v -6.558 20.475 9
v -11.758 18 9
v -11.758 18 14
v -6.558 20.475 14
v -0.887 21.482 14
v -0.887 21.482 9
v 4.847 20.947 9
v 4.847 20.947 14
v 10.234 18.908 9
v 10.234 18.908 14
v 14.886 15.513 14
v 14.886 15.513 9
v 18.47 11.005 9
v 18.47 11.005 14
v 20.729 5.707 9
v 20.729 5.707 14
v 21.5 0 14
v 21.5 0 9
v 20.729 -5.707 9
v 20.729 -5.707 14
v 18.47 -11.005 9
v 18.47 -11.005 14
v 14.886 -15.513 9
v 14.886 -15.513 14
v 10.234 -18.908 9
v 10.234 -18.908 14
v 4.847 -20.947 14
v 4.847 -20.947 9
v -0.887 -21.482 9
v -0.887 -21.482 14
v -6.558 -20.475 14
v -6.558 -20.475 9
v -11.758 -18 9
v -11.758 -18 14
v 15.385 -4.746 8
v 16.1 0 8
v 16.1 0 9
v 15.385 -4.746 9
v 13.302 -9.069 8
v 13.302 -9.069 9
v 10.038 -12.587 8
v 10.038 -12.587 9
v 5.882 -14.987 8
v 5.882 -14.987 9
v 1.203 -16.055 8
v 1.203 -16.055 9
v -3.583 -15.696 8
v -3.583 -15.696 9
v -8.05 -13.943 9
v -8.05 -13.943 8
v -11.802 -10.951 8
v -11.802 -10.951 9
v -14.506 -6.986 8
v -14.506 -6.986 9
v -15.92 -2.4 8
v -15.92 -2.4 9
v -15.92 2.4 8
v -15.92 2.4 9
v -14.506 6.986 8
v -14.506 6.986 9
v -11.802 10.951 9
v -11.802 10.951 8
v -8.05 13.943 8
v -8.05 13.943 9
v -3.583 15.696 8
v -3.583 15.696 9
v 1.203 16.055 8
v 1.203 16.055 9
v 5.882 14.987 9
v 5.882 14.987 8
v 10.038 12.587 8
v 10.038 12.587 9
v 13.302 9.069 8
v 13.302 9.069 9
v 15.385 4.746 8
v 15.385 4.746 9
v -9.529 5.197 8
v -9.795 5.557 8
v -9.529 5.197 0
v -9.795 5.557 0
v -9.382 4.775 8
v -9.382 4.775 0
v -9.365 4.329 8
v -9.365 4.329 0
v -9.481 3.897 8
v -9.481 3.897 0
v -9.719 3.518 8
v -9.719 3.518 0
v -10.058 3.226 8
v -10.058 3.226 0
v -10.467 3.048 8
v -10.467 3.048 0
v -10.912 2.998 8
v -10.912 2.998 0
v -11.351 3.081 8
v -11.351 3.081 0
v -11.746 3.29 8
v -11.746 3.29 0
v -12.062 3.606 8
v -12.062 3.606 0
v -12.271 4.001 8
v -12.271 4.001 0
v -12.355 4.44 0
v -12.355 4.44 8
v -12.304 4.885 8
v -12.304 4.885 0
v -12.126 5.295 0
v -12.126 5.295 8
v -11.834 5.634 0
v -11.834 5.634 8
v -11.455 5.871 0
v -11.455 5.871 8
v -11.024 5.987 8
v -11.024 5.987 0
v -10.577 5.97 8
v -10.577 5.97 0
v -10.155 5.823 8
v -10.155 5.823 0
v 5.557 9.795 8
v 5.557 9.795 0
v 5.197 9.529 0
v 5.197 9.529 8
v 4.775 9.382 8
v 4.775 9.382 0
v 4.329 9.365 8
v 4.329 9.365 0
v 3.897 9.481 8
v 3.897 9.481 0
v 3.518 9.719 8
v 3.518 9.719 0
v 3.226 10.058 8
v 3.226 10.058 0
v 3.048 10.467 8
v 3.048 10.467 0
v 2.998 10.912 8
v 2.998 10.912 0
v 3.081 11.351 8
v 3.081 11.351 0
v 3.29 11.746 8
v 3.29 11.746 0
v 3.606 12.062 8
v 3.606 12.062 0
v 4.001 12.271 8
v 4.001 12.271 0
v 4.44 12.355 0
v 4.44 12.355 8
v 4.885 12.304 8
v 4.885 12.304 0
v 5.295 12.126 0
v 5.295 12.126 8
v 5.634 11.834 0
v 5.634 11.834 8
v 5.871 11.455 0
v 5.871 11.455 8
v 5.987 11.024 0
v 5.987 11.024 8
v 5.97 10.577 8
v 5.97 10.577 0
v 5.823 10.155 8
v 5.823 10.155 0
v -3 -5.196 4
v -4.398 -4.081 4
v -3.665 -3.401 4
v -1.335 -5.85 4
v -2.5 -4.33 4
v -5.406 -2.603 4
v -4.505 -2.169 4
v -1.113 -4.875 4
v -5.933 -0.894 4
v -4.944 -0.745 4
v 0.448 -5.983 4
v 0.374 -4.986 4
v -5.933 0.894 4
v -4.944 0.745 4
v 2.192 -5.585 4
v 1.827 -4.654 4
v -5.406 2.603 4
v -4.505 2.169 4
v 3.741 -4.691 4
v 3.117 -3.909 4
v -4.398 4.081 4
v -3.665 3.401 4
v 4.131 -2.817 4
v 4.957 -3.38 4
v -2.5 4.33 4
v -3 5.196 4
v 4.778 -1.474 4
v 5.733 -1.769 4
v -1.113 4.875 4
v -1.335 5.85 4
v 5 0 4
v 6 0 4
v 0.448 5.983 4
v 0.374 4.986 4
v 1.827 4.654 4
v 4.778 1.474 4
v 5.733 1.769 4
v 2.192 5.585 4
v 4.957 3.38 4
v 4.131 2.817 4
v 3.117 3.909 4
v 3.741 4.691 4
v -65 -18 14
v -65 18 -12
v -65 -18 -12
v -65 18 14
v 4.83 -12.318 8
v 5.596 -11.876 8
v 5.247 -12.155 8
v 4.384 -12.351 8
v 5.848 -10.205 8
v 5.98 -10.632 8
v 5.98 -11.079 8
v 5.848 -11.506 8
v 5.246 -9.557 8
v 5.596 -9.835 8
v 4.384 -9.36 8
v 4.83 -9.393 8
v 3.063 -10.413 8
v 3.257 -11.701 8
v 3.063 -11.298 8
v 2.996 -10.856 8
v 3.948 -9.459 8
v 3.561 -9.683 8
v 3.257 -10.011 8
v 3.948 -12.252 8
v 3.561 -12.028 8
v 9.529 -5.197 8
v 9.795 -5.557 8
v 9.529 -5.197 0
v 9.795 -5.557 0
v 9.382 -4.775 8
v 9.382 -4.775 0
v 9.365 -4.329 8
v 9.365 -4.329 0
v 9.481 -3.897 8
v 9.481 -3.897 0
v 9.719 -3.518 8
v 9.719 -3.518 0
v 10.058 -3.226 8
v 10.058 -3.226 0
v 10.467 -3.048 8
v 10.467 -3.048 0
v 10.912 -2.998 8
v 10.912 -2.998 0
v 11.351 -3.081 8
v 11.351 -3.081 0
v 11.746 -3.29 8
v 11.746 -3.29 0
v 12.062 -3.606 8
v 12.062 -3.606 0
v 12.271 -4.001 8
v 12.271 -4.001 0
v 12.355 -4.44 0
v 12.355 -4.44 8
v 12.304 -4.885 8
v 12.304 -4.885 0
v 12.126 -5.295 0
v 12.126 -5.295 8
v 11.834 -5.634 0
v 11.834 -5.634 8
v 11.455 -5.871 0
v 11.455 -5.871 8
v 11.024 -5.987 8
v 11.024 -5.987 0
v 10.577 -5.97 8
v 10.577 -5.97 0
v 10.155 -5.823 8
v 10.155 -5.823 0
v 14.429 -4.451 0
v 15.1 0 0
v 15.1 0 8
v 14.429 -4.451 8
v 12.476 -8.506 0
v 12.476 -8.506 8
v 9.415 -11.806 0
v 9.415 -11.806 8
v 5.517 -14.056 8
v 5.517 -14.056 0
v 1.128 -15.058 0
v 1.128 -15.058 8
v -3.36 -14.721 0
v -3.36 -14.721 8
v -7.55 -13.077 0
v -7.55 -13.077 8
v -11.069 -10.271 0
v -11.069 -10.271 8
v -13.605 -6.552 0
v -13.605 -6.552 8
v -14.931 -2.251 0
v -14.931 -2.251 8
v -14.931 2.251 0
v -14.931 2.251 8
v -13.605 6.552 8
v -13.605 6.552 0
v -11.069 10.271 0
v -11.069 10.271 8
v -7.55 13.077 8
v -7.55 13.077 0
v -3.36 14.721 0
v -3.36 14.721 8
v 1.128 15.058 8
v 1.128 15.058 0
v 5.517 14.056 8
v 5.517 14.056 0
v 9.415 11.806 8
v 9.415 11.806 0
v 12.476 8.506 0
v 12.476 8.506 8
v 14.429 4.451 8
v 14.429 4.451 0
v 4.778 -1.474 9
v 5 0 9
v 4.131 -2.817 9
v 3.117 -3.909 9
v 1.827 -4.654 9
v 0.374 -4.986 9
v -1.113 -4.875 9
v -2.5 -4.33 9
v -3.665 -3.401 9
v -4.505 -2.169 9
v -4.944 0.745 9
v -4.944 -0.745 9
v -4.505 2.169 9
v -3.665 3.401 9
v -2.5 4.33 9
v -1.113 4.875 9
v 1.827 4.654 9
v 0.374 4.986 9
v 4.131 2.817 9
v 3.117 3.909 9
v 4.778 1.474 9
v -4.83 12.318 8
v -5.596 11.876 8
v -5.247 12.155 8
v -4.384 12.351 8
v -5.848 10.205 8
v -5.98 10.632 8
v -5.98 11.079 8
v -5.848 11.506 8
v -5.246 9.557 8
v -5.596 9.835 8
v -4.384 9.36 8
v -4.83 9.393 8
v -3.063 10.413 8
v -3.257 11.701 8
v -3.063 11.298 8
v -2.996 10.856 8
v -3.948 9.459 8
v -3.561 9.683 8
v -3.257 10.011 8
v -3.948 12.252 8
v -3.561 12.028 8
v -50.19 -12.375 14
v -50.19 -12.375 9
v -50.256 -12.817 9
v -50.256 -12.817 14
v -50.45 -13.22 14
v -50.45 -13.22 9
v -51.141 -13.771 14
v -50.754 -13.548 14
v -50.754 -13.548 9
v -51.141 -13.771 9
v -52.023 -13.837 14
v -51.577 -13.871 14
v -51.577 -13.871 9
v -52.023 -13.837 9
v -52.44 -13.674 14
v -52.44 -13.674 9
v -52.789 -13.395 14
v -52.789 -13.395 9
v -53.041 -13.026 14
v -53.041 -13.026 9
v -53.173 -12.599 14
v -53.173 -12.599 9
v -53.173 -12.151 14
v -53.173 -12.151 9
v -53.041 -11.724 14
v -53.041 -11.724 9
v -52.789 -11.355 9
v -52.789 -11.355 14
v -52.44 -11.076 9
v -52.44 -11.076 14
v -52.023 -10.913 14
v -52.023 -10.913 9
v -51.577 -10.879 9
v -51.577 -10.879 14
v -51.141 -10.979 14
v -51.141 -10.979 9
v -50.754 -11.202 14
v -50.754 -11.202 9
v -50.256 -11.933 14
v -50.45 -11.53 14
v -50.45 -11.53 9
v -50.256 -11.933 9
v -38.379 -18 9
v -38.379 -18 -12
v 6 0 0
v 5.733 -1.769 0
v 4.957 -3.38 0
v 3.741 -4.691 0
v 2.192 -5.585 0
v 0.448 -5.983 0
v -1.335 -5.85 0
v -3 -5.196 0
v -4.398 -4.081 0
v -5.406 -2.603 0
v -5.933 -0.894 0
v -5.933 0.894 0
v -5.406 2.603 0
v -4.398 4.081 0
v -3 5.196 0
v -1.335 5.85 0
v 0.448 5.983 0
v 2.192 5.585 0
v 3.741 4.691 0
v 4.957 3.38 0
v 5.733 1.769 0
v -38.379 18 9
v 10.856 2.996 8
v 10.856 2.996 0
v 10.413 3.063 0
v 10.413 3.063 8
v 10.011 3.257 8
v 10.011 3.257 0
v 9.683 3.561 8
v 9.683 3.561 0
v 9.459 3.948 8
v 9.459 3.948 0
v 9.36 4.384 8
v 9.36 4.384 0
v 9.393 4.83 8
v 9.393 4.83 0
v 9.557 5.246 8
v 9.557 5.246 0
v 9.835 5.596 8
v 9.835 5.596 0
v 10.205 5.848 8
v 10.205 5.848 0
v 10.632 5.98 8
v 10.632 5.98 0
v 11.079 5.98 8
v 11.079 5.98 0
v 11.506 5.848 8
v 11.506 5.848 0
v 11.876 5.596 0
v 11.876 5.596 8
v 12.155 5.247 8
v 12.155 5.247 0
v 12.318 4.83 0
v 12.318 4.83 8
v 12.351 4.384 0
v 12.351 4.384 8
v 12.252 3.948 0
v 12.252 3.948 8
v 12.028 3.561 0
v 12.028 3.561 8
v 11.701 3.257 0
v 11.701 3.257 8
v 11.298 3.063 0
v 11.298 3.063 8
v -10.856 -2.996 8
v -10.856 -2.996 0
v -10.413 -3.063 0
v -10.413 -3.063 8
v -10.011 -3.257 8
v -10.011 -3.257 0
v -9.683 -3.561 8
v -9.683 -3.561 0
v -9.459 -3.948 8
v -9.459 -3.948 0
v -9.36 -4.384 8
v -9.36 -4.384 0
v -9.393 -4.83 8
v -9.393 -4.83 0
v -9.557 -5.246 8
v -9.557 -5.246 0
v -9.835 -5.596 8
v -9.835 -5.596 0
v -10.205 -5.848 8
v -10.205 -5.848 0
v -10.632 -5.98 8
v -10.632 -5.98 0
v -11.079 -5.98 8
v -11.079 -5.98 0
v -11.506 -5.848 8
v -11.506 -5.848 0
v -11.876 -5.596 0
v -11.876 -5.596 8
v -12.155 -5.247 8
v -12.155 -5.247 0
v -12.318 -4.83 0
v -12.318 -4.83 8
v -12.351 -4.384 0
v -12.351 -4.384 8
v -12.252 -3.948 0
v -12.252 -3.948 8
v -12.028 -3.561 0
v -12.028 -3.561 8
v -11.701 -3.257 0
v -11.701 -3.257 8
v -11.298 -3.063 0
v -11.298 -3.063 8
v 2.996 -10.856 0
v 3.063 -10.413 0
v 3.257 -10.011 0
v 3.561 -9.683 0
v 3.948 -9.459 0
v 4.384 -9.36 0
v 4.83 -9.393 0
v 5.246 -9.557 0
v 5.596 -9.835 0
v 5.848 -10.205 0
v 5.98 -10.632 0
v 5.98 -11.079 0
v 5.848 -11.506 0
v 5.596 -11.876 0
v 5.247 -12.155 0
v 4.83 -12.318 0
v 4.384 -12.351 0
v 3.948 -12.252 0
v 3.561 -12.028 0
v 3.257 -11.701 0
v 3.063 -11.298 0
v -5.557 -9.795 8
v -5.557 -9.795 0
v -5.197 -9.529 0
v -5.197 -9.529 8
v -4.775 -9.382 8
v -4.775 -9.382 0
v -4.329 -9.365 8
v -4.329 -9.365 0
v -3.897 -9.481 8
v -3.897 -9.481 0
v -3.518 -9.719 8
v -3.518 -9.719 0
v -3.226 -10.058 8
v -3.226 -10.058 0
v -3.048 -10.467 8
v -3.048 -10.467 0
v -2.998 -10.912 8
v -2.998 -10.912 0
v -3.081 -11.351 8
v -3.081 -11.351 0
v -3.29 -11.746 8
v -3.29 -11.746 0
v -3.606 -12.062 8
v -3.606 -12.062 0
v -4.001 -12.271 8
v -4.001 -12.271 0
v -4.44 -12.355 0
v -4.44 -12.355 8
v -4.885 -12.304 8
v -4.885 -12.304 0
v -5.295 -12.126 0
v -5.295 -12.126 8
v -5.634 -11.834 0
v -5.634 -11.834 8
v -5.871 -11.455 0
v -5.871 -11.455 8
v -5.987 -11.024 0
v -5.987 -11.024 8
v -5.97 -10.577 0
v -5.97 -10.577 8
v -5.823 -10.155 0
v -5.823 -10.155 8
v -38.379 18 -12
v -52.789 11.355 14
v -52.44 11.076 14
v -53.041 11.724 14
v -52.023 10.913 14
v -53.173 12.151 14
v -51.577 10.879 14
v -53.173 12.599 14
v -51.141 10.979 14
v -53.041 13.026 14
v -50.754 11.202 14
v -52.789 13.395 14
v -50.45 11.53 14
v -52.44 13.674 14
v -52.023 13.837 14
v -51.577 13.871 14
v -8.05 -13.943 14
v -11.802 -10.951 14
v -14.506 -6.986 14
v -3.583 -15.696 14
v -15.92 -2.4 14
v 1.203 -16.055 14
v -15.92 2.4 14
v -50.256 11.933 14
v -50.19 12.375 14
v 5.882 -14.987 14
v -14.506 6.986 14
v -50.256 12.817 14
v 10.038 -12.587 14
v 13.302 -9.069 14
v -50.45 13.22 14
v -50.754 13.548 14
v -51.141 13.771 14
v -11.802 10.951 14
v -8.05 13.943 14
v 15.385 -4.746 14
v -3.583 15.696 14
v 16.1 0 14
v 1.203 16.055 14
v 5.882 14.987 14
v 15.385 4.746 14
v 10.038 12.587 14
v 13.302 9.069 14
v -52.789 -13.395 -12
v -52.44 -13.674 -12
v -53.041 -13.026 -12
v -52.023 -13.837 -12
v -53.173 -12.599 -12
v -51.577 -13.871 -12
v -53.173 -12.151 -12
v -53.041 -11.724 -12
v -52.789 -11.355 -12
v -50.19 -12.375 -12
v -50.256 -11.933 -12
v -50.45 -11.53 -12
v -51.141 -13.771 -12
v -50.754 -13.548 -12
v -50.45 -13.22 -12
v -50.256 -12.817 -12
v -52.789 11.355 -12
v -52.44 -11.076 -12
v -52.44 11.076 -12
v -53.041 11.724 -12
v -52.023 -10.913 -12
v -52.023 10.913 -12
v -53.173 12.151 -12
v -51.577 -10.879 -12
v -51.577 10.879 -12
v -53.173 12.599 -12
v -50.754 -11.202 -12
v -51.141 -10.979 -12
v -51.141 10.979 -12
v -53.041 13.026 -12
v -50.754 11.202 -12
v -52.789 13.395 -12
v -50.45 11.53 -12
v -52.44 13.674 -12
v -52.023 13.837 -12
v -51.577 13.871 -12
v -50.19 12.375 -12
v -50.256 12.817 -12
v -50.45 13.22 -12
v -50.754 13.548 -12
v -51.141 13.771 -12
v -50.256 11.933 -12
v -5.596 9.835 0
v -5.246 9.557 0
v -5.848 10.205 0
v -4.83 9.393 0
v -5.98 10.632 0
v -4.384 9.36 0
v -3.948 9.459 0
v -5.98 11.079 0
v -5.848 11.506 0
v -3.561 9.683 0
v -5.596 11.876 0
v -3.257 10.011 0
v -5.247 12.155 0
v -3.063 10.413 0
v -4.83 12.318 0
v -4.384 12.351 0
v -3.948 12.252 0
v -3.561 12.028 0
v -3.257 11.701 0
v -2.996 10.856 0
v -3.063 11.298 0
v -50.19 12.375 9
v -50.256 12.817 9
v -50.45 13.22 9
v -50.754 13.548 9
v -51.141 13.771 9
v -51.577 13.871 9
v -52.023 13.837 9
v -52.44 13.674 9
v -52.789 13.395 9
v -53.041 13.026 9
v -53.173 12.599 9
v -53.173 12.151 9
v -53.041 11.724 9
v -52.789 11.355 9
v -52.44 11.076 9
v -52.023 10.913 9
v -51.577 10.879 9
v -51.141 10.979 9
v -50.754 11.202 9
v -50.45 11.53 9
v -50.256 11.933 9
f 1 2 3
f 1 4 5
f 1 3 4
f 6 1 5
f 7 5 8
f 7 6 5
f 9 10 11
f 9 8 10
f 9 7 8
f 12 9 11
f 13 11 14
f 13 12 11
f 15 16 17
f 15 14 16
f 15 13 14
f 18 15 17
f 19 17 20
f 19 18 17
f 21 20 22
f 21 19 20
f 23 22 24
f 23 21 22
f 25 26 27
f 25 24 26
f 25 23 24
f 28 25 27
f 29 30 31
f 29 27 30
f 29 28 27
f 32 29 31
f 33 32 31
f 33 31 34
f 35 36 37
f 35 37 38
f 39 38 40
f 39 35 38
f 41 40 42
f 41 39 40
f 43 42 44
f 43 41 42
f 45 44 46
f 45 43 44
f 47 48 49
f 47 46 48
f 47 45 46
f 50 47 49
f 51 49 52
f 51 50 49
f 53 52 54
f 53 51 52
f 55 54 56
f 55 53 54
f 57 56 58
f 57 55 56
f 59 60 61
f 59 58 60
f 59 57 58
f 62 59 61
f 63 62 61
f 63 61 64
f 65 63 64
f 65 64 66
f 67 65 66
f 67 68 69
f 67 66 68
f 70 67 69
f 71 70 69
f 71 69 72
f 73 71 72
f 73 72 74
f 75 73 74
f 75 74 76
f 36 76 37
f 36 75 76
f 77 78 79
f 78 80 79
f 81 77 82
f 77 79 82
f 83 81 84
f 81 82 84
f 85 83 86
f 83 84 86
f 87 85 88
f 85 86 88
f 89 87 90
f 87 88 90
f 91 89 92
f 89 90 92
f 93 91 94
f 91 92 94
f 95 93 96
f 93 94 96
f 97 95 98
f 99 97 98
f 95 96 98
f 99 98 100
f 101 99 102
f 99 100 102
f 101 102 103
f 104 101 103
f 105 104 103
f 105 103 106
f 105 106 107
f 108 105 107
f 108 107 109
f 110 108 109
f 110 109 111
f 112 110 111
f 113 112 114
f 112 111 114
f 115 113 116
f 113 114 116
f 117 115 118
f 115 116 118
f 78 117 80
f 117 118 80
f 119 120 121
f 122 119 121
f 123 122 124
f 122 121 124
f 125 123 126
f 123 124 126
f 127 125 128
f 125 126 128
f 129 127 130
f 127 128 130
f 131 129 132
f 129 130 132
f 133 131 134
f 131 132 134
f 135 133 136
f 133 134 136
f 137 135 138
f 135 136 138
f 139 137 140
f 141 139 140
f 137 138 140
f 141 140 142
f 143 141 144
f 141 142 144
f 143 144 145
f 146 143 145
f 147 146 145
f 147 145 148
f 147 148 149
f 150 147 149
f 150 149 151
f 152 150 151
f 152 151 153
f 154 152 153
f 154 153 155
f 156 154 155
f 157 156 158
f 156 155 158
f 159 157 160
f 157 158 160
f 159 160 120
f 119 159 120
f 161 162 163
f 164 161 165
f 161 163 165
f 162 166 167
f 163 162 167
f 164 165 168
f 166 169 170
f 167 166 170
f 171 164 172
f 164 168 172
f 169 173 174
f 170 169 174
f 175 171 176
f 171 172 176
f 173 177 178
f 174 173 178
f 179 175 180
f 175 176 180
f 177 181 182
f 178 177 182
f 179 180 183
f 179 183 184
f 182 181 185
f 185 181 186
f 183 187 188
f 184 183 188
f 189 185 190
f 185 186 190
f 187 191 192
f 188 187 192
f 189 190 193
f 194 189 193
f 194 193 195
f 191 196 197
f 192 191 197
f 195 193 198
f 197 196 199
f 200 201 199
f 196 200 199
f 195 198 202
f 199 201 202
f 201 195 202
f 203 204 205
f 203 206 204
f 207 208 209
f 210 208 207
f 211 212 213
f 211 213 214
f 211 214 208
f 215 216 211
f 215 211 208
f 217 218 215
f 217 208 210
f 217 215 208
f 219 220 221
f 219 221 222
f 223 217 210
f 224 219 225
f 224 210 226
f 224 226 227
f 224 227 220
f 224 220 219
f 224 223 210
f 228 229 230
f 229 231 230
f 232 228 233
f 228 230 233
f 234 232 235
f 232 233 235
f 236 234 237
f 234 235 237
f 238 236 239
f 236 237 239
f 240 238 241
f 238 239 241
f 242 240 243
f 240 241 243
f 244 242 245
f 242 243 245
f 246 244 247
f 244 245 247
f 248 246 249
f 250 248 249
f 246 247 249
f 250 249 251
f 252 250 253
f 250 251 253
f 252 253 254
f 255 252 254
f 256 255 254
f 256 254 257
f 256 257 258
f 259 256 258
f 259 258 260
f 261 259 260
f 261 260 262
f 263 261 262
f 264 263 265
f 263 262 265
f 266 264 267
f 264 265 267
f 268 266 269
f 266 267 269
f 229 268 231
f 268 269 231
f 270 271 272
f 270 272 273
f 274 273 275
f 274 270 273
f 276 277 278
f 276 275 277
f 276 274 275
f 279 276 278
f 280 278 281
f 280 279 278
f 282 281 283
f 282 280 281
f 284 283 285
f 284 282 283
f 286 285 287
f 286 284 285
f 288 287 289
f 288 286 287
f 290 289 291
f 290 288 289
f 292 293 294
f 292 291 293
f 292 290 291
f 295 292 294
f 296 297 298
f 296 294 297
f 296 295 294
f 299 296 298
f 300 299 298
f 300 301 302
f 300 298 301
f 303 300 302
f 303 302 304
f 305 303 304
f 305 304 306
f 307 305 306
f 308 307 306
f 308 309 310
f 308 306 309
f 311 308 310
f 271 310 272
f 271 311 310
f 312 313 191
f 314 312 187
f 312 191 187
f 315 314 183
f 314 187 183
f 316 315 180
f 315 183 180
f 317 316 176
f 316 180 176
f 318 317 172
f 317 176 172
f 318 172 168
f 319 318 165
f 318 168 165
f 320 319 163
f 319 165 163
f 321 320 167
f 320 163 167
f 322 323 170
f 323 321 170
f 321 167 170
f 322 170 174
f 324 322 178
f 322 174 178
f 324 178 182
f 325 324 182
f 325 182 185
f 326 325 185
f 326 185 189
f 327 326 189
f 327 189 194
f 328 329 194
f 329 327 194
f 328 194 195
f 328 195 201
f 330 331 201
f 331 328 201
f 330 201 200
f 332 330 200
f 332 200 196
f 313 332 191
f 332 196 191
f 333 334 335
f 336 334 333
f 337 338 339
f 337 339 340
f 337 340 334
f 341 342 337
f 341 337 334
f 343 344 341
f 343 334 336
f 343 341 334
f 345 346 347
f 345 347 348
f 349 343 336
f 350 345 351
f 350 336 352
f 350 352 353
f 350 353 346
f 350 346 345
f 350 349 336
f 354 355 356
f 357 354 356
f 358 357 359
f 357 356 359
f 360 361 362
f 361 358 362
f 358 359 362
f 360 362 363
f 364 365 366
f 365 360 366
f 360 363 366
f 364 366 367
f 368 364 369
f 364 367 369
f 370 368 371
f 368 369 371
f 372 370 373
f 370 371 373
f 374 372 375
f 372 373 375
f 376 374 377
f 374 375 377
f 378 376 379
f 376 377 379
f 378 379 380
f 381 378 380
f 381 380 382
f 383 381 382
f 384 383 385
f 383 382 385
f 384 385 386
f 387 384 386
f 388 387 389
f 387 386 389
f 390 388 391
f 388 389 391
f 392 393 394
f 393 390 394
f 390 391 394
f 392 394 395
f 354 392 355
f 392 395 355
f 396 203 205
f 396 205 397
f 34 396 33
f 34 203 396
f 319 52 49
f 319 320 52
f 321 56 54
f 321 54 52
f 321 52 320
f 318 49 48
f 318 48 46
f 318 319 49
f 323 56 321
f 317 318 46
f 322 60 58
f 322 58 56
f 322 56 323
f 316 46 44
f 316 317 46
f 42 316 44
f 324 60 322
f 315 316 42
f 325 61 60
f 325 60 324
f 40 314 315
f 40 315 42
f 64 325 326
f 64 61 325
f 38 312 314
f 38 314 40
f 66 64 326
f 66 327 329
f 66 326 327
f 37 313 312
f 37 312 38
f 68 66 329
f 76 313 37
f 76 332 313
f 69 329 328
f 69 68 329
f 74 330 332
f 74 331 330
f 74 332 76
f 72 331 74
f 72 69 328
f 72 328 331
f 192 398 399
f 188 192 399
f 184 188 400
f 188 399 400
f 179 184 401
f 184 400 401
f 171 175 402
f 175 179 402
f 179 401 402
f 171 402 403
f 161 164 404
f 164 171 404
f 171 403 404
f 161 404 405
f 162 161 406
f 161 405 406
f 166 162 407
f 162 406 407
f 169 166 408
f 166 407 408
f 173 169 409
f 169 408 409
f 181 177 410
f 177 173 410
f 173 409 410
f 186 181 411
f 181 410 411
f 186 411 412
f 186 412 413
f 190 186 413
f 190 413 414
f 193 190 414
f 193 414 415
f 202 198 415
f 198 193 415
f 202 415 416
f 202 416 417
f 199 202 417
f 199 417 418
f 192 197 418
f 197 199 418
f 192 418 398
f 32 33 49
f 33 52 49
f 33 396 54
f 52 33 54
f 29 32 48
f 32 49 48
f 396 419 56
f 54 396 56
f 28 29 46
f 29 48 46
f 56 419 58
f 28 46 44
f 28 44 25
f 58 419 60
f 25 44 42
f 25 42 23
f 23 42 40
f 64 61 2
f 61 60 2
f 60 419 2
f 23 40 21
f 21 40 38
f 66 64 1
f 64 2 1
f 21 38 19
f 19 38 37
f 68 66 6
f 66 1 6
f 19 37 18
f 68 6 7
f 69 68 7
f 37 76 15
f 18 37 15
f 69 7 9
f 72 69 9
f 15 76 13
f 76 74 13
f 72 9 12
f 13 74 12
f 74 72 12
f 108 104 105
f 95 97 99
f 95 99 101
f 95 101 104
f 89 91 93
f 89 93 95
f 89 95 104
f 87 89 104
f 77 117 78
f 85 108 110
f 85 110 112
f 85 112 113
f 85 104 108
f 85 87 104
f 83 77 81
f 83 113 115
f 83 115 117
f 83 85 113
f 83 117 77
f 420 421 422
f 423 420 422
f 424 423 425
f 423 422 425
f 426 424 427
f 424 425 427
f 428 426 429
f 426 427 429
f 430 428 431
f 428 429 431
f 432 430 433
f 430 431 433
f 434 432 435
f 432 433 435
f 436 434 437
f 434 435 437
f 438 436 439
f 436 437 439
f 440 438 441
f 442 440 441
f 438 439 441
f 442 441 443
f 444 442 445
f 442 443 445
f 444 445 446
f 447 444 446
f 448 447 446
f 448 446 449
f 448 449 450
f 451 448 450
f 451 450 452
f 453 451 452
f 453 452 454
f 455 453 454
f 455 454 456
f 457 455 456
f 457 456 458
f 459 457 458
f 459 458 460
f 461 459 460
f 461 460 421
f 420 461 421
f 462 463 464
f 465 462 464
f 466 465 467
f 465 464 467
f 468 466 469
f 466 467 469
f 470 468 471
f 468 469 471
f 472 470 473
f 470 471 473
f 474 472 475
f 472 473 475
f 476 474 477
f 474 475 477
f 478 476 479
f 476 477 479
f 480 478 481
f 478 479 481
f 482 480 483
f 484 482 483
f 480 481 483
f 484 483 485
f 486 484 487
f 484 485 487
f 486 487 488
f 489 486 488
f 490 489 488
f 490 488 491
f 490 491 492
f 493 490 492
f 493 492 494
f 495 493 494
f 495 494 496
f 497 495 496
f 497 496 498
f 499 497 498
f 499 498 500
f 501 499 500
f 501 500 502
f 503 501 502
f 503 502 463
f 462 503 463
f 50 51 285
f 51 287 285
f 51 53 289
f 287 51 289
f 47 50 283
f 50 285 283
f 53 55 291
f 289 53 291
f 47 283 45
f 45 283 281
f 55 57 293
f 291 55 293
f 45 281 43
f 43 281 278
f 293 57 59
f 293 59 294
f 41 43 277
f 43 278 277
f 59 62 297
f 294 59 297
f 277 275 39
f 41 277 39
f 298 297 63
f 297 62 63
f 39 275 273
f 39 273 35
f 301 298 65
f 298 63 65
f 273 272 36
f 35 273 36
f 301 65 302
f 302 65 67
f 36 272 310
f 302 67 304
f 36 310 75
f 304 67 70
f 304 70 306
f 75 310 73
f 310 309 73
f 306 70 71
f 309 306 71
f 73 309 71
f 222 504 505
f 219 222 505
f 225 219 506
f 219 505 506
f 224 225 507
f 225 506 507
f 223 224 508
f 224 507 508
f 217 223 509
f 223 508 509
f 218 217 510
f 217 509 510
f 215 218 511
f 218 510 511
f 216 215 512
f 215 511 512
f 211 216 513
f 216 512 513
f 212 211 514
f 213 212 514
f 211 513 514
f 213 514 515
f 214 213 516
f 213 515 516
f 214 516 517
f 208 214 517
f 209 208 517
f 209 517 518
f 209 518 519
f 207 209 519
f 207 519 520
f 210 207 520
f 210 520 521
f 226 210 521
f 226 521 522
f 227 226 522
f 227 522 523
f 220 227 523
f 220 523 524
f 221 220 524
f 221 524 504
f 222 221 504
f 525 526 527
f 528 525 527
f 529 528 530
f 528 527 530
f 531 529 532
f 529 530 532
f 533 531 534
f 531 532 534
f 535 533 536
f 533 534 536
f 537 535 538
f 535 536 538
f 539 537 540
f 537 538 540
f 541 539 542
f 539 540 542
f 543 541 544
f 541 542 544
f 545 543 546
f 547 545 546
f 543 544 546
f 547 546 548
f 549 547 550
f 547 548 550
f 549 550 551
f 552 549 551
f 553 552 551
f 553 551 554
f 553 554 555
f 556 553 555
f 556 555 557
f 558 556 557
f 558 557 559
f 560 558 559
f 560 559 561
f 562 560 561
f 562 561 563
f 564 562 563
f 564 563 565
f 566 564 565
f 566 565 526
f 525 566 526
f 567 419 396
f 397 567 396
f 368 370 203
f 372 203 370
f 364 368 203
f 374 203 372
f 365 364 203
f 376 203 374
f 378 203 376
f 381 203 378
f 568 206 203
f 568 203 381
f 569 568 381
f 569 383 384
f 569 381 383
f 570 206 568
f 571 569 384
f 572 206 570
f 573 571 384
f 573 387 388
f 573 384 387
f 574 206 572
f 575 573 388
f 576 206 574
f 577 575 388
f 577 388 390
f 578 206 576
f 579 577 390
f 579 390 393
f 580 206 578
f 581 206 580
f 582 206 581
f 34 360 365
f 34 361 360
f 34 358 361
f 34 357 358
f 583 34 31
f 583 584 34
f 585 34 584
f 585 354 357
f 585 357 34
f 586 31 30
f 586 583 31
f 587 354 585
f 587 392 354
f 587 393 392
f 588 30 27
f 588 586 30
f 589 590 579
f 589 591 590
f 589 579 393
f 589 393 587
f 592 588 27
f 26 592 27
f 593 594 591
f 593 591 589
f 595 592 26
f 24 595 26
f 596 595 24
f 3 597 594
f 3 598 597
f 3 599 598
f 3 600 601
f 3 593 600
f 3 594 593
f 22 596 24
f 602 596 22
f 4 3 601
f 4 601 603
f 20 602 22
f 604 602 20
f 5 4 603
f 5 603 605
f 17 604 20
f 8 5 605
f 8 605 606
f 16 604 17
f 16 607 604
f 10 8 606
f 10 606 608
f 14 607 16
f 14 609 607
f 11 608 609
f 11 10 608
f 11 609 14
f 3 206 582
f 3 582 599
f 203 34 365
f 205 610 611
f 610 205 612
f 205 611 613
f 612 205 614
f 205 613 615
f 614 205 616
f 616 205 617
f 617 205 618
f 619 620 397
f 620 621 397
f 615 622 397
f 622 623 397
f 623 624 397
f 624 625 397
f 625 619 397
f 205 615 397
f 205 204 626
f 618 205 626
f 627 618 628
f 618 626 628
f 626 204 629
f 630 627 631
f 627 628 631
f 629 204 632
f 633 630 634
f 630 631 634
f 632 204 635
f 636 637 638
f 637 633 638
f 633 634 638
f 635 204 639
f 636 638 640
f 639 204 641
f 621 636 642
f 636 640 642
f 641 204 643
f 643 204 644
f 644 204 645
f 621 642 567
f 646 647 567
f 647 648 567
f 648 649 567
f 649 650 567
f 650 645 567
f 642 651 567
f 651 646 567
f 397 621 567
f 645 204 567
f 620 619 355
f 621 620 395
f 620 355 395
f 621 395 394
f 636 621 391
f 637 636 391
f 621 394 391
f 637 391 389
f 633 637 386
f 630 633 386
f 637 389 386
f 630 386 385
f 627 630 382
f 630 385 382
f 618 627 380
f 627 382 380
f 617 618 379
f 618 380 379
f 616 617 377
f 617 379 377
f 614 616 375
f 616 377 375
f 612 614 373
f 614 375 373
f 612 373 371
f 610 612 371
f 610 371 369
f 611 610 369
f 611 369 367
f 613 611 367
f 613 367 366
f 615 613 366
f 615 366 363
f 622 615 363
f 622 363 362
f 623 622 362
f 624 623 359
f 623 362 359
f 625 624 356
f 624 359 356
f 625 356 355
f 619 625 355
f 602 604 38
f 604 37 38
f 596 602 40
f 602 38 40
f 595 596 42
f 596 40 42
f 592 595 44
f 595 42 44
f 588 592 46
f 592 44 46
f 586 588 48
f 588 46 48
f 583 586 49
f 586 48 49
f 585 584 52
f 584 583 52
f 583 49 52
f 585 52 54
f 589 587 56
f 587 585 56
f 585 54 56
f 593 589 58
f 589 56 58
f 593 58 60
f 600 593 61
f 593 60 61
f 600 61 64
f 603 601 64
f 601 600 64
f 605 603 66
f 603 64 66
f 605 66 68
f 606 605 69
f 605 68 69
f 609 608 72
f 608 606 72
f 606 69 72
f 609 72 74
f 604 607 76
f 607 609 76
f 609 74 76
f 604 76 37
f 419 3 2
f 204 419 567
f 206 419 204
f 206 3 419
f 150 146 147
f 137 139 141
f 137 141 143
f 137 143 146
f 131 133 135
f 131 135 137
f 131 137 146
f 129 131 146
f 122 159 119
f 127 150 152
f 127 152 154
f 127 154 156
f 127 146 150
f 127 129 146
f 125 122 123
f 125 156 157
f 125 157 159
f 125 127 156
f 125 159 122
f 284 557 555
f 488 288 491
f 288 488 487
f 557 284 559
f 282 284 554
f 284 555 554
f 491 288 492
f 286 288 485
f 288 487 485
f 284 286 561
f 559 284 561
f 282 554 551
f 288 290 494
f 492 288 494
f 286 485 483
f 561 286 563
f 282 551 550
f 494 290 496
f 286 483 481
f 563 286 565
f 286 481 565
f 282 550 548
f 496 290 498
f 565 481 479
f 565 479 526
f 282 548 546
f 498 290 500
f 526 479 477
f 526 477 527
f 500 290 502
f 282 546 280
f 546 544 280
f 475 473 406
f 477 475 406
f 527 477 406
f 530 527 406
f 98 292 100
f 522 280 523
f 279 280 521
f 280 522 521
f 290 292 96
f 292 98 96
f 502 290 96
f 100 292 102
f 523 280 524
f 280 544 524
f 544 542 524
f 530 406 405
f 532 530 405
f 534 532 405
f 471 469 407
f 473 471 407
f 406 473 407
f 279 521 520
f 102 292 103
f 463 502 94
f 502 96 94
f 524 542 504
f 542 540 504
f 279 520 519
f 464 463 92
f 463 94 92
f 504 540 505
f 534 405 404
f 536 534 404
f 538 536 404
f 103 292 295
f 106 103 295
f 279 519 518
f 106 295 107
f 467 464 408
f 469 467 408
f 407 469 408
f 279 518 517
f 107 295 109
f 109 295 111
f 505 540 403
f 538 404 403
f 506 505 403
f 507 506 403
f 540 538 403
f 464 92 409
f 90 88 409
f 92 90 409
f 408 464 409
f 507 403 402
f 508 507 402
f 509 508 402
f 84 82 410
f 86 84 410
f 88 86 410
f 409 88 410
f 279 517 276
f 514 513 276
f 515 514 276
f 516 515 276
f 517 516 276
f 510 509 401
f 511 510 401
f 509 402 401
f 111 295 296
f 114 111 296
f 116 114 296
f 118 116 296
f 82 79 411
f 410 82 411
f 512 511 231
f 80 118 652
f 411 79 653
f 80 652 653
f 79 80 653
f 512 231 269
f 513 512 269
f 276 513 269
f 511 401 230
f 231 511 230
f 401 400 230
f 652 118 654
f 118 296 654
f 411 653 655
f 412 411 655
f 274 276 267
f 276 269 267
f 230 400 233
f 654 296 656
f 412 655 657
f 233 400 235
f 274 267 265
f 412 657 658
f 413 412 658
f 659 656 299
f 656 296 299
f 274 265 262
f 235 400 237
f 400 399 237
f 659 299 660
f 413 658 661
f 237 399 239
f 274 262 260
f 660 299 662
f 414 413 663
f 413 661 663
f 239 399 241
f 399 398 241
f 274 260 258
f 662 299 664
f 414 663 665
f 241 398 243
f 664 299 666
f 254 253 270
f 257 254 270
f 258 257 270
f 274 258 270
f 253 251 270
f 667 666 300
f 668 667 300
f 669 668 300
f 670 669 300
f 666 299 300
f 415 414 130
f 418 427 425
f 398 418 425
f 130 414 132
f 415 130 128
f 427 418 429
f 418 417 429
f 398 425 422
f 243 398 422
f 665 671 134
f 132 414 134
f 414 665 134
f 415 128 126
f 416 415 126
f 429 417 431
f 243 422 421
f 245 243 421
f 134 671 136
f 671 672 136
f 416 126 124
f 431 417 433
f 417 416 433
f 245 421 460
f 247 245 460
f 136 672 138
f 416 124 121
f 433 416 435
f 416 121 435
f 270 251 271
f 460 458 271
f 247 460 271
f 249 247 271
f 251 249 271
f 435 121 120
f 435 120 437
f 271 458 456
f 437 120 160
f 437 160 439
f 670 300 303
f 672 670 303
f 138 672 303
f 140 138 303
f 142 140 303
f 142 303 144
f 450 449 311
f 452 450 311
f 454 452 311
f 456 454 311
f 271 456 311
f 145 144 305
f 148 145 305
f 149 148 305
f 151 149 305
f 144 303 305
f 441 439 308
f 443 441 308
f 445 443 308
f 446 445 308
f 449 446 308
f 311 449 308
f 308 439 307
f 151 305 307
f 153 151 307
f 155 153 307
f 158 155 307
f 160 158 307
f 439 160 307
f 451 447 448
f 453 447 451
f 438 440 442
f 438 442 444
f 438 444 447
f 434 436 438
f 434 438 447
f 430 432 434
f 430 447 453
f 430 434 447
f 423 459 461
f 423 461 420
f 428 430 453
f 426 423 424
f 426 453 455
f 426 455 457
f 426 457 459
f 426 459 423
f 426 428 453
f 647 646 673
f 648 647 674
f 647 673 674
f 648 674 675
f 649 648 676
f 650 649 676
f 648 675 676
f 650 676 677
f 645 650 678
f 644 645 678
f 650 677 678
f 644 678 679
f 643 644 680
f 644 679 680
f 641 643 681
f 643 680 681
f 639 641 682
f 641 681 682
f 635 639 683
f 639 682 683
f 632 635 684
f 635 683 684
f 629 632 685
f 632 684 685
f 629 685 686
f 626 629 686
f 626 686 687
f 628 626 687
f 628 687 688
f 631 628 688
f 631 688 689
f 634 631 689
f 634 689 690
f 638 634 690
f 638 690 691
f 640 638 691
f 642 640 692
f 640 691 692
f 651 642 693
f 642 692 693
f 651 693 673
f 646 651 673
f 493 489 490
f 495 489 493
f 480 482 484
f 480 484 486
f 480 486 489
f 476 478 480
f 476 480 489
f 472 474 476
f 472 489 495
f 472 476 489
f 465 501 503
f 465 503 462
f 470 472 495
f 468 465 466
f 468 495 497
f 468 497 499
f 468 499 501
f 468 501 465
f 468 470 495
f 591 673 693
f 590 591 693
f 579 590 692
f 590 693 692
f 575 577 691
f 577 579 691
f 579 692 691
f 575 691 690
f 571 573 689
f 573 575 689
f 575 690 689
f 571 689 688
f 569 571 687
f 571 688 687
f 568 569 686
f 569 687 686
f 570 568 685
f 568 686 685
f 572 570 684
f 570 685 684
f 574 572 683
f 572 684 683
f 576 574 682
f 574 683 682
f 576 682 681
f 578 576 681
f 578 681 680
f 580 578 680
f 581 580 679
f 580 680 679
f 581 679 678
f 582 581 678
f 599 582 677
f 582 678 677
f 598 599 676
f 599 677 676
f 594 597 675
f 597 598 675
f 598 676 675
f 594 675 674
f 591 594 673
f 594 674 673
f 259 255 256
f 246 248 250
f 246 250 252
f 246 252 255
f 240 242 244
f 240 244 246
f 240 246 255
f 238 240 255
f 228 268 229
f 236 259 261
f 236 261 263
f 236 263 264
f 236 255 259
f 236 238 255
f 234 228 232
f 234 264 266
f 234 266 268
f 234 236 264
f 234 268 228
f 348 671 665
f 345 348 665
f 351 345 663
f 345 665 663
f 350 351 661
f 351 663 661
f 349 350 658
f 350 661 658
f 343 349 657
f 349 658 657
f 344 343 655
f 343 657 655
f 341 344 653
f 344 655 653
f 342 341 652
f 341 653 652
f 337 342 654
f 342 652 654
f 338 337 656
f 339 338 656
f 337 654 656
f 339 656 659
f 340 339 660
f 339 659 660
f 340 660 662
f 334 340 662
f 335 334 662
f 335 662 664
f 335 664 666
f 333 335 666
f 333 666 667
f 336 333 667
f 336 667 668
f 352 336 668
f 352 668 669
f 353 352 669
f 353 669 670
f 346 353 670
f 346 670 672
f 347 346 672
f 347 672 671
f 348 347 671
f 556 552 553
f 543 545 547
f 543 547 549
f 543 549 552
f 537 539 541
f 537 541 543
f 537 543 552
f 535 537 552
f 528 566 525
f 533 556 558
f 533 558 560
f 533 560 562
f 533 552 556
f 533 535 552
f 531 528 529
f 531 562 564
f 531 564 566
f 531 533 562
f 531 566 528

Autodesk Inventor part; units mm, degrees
ref_plane "YZ Plane" through (0, 0, 0) normal (1, 0, 0) x (0, 1, 0)
ref_plane "XZ Plane" through (0, 0, 0) normal (0, 1, 0) x (-1, 0, 0)
ref_plane "XY Plane" through (0, 0, 0) normal (0, 0, 1) x (1, 0, 0)
sketch "Sketch1" plane through (0, 0, 0) normal (0, 0, 1) x (1, 0, 0)
  circle A0 centre (0, 0) radius 15.1
  circle A1 centre (0, 0) radius 5
  dimension "d0" = 30.2
  dimension "d1" = 10
extrude "Extrusion1" add sketch "Sketch1" along normal blind 8
sketch "Sketch3" plane through (0, 0, 8) normal (0, 0, 1) x (1, 0, 0)
  circle A0 centre (0, 0) radius 5 projected
  circle A1 centre (0, 0) radius 15.1 projected
  circle A2 centre (0, 0) radius 16.1
  dimension "d21" = 1
extrude "Extrusion3" add sketch "Sketch3" along normal blind 1 contours A1 | A2
sketch "Sketch4" plane through (0, 0, 9) normal (0, 0, 1) x (1, 0, 0)
  circle A0 centre (0, 0) radius 5 projected
  circle A1 centre (0, 0) radius 16.1 projected
  arc A2 (-21.5, 0) -> (-11.758, -18) centre (0, 0) ccw construction
  line L0 (0, 0) -> (-37.0387, 0) construction
  line L1 (-11.758, 18) -> (-65, 18)
  line L2 (-65, 18) -> (-65, -18)
  arc A3 (-65, -18) -> (-65, -18) centre (-67.4575, -18) ccw
  circle A4 centre (-51.6895, 12.375) radius 1.5
  circle A5 centre (-51.6895, -12.375) radius 1.5
  circle A6 centre (0, 0) radius 6
  circle A7 centre (0, 0) radius 9
  line L3 (-65, -18) -> (-11.758, -18)
  line L4 (-11.758, 18) -> (-11.758, -18) construction
  line L5 (-38.379, 18) -> (-38.379, -18)
  line L6 (-51.6895, 12.375) -> (-51.6895, -12.375) construction
  arc A8 (-11.758, 18) -> (-21.5, 0) centre (0, 0) ccw construction
  arc A9 (-11.758, -18) -> (-11.758, 18) centre (0, 0) ccw
  dimension "d22" = 43
  dimension "d31" = 65
  dimension "d623" = 3
  dimension "d624" = 24.75
  dimension "d627" = 12
  dimension "d628" = 3
  dimension "d633" = 36
extrude "Extrusion5" add sketch "Sketch4" along normal blind 5 contours A9 L3 L5 L1 | L5 L3 L2 L1
sketch "Sketch17" plane through (0, 0, 0) normal (0, 0, -1) x (-1, 0, 0)
  circle A0 centre (0, 0) radius 5 projected
  circle A1 centre (0, 0) radius 15.1 projected
  line L0 (0, 0) -> (0, -15.1) construction
  circle A2 centre (0, 0) radius 15.1 projected
  line L1 (0, 0) -> (-5.7785, -13.9506) construction
  circle A3 centre (-4.4965, -10.8556) radius 1.5
  dimension "d100" = 22.5
  dimension "d101" = 3
  dimension "d102" = 11.75
extrude "Extrusion14" cut sketch "Sketch17" against normal blind 8 contours A3
pattern_circular "Circular Pattern3" count 8 over 360 about axis through (0, 0, 0) along (0, 0, 1) of "Extrusion14"
extrude "Extrusion85" add sketch "Sketch4" against normal blind 21 contours L5 L3 L2 L1
extrude "Extrusion86" cut sketch "Sketch4" along normal through all both and the other way through all contours A4 | A5
extrude "Extrusion88" cut sketch "Sketch4" along normal blind 4 from surface at -9 contours A0 | A6
equation "\"E_\" = 1"
equation "\"Rr_\" = 2"
equation "\"R_\" = 19"
equation "\"Ri\" = 11.75"
equation "\"Ra\" = 21.5"
equation "\"Rl\" = 17.5"
equation "\"Rla\" = 18.5"
equation "\"Rli\" = 15"
equation "\"Rsi\" = 5"
equation "\"Rsa\" = 7.5"
equation "\"Rca\" = 7"
equation "\"Ras\" = 1"
equation "\"Rci\" = 5"
equation "\"Rea\" = 3.5"
equation "\"Rei\" = 2"
properties part number "encoder in 6809_ab"
